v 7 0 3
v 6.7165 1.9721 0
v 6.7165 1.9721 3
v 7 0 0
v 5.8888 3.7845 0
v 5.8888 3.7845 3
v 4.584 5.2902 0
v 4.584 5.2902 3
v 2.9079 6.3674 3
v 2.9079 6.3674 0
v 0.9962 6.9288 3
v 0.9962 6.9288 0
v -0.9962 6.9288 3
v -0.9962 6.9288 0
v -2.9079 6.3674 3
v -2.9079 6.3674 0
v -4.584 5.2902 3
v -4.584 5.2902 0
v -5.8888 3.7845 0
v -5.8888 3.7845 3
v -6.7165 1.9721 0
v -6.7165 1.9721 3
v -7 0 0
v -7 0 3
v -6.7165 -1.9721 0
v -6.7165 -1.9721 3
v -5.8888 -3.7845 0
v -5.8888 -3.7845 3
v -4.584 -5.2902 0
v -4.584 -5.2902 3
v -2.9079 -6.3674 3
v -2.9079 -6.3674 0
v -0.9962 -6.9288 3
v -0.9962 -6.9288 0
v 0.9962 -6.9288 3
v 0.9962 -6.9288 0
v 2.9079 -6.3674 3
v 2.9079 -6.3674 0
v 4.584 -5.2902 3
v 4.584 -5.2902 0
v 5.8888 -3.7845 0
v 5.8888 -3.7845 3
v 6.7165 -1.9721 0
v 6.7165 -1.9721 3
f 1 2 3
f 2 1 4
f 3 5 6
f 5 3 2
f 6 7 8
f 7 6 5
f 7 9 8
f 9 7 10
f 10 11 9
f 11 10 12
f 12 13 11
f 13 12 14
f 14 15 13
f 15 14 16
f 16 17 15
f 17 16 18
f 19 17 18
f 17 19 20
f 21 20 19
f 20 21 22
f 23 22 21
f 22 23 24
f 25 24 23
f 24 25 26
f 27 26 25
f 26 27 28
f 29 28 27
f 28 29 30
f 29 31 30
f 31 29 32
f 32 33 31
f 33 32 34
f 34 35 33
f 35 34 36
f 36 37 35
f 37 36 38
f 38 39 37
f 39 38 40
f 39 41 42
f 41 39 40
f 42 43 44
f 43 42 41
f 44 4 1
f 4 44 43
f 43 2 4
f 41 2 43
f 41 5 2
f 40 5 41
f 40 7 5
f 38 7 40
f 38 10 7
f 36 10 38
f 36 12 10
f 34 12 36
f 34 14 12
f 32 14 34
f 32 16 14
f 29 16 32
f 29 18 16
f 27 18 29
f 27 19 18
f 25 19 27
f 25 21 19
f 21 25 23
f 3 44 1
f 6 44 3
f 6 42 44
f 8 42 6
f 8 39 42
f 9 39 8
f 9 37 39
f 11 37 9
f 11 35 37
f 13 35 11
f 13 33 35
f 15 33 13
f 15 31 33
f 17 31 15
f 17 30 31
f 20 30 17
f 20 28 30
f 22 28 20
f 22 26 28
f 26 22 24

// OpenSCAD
// Generated by SolidPython 1.0.1 on 2020-07-29 00:39:25


cylinder(h = 3, r1 = 7, r2 = 7);
/***********************************************
*********      SolidPython code:      **********
************************************************
 
# import packages: SolidPython
from solid import *
from solid.utils import *
from itertools import chain, combinations


class Resize:

    def __init__(self, scad_file):
        self.scad_file = scad_file
        #self.scad_file = import_scad(scad_file)
        # cone/cylinder param:
        self.r1 = 0
        self.r2 = 0
        self.h = 0
        # rectangular prism param:
        self.w = 0
        self.l = 0
        # ellipse param:
        self.r = 0

    # import OpenScad code (file name corresponds to shape)


    # classify shape + parameters
    def assign(self, param1, param2, param3):
        if self.scad_file == 'cone.scad':
            self.r1 = param1
            self.r2 = param2
            self.h = param3
        elif self.scad_file == 'cylinder.scad':
            self.r1 = param1
            self.r2 = param2
            self.h = param3
        elif self.scad_file == 'rectangularPrism.scad':
            self.h = param1
            self.l = param2
            self.w = param3
        else:
            self.r = param1
            self.h = param2

    # resize parameters
    def iterate(self):
        x = range(3, 20, 2)
        i = 1
        if self.scad_file == 'cone.scad':
            tempList = list(combinations(x, 2))
            for temp in tempList:
                param1 = temp[0]
                param2 = temp[1]
                filepath = 'produced_scad_files/' + 'cone' + str(param1) + '_' + str(param2) + '_' + '.scad'
                scad_render_to_file(cylinder(h=param1, r1=param2, r2=0), filepath)

        elif self.scad_file == 'cylinder.scad':
            tempList = list(combinations(x, 3))
            for temp in tempList:
                param1 = temp[0]
                param2 = temp[1]
                filepath = 'produced_scad_files/' + 'cylinder' + str(param1) + '_' + str(param2) + '_' + '.scad'
                scad_render_to_file(cylinder(h=param1, r1=param2, r2=param2), filepath)

        elif self.scad_file == 'rectangularPrism.scad':
            tempList = list(combinations(x, 3))
            for temp in tempList:
                param1 = temp[0]
                param2 = temp[1]
                param3 = temp[2]
                filepath = 'produced_scad_files/' + 'rectangularPrism' + str(param1) + '_' + str(param2) + '_' + str(
                    param3) + '.scad'
                scad_render_to_file(cube(size=(param1, param2, param3)), filepath)

        elif self.scad_file == 'ellipse.scad':
            tempList = list(combinations(x, 4))
            for temp in tempList:
                param1 = temp[0]
                param2 = temp[1]
                param3 = temp[2]
                param4 = temp[3]
                filepath = 'produced_scad_files/' + 'ellipse' + str(param1) + '_' + str(param2) + '_' + str(param3) + '_' + str(param4) + '.scad'
                scad_render_to_file(scale([param1, param2, param3])(sphere(r=param4)), filepath)

    def render_to_scadfile(self):
        scad_render_to_file(scad, 'example.scad') 
 
************************************************/
